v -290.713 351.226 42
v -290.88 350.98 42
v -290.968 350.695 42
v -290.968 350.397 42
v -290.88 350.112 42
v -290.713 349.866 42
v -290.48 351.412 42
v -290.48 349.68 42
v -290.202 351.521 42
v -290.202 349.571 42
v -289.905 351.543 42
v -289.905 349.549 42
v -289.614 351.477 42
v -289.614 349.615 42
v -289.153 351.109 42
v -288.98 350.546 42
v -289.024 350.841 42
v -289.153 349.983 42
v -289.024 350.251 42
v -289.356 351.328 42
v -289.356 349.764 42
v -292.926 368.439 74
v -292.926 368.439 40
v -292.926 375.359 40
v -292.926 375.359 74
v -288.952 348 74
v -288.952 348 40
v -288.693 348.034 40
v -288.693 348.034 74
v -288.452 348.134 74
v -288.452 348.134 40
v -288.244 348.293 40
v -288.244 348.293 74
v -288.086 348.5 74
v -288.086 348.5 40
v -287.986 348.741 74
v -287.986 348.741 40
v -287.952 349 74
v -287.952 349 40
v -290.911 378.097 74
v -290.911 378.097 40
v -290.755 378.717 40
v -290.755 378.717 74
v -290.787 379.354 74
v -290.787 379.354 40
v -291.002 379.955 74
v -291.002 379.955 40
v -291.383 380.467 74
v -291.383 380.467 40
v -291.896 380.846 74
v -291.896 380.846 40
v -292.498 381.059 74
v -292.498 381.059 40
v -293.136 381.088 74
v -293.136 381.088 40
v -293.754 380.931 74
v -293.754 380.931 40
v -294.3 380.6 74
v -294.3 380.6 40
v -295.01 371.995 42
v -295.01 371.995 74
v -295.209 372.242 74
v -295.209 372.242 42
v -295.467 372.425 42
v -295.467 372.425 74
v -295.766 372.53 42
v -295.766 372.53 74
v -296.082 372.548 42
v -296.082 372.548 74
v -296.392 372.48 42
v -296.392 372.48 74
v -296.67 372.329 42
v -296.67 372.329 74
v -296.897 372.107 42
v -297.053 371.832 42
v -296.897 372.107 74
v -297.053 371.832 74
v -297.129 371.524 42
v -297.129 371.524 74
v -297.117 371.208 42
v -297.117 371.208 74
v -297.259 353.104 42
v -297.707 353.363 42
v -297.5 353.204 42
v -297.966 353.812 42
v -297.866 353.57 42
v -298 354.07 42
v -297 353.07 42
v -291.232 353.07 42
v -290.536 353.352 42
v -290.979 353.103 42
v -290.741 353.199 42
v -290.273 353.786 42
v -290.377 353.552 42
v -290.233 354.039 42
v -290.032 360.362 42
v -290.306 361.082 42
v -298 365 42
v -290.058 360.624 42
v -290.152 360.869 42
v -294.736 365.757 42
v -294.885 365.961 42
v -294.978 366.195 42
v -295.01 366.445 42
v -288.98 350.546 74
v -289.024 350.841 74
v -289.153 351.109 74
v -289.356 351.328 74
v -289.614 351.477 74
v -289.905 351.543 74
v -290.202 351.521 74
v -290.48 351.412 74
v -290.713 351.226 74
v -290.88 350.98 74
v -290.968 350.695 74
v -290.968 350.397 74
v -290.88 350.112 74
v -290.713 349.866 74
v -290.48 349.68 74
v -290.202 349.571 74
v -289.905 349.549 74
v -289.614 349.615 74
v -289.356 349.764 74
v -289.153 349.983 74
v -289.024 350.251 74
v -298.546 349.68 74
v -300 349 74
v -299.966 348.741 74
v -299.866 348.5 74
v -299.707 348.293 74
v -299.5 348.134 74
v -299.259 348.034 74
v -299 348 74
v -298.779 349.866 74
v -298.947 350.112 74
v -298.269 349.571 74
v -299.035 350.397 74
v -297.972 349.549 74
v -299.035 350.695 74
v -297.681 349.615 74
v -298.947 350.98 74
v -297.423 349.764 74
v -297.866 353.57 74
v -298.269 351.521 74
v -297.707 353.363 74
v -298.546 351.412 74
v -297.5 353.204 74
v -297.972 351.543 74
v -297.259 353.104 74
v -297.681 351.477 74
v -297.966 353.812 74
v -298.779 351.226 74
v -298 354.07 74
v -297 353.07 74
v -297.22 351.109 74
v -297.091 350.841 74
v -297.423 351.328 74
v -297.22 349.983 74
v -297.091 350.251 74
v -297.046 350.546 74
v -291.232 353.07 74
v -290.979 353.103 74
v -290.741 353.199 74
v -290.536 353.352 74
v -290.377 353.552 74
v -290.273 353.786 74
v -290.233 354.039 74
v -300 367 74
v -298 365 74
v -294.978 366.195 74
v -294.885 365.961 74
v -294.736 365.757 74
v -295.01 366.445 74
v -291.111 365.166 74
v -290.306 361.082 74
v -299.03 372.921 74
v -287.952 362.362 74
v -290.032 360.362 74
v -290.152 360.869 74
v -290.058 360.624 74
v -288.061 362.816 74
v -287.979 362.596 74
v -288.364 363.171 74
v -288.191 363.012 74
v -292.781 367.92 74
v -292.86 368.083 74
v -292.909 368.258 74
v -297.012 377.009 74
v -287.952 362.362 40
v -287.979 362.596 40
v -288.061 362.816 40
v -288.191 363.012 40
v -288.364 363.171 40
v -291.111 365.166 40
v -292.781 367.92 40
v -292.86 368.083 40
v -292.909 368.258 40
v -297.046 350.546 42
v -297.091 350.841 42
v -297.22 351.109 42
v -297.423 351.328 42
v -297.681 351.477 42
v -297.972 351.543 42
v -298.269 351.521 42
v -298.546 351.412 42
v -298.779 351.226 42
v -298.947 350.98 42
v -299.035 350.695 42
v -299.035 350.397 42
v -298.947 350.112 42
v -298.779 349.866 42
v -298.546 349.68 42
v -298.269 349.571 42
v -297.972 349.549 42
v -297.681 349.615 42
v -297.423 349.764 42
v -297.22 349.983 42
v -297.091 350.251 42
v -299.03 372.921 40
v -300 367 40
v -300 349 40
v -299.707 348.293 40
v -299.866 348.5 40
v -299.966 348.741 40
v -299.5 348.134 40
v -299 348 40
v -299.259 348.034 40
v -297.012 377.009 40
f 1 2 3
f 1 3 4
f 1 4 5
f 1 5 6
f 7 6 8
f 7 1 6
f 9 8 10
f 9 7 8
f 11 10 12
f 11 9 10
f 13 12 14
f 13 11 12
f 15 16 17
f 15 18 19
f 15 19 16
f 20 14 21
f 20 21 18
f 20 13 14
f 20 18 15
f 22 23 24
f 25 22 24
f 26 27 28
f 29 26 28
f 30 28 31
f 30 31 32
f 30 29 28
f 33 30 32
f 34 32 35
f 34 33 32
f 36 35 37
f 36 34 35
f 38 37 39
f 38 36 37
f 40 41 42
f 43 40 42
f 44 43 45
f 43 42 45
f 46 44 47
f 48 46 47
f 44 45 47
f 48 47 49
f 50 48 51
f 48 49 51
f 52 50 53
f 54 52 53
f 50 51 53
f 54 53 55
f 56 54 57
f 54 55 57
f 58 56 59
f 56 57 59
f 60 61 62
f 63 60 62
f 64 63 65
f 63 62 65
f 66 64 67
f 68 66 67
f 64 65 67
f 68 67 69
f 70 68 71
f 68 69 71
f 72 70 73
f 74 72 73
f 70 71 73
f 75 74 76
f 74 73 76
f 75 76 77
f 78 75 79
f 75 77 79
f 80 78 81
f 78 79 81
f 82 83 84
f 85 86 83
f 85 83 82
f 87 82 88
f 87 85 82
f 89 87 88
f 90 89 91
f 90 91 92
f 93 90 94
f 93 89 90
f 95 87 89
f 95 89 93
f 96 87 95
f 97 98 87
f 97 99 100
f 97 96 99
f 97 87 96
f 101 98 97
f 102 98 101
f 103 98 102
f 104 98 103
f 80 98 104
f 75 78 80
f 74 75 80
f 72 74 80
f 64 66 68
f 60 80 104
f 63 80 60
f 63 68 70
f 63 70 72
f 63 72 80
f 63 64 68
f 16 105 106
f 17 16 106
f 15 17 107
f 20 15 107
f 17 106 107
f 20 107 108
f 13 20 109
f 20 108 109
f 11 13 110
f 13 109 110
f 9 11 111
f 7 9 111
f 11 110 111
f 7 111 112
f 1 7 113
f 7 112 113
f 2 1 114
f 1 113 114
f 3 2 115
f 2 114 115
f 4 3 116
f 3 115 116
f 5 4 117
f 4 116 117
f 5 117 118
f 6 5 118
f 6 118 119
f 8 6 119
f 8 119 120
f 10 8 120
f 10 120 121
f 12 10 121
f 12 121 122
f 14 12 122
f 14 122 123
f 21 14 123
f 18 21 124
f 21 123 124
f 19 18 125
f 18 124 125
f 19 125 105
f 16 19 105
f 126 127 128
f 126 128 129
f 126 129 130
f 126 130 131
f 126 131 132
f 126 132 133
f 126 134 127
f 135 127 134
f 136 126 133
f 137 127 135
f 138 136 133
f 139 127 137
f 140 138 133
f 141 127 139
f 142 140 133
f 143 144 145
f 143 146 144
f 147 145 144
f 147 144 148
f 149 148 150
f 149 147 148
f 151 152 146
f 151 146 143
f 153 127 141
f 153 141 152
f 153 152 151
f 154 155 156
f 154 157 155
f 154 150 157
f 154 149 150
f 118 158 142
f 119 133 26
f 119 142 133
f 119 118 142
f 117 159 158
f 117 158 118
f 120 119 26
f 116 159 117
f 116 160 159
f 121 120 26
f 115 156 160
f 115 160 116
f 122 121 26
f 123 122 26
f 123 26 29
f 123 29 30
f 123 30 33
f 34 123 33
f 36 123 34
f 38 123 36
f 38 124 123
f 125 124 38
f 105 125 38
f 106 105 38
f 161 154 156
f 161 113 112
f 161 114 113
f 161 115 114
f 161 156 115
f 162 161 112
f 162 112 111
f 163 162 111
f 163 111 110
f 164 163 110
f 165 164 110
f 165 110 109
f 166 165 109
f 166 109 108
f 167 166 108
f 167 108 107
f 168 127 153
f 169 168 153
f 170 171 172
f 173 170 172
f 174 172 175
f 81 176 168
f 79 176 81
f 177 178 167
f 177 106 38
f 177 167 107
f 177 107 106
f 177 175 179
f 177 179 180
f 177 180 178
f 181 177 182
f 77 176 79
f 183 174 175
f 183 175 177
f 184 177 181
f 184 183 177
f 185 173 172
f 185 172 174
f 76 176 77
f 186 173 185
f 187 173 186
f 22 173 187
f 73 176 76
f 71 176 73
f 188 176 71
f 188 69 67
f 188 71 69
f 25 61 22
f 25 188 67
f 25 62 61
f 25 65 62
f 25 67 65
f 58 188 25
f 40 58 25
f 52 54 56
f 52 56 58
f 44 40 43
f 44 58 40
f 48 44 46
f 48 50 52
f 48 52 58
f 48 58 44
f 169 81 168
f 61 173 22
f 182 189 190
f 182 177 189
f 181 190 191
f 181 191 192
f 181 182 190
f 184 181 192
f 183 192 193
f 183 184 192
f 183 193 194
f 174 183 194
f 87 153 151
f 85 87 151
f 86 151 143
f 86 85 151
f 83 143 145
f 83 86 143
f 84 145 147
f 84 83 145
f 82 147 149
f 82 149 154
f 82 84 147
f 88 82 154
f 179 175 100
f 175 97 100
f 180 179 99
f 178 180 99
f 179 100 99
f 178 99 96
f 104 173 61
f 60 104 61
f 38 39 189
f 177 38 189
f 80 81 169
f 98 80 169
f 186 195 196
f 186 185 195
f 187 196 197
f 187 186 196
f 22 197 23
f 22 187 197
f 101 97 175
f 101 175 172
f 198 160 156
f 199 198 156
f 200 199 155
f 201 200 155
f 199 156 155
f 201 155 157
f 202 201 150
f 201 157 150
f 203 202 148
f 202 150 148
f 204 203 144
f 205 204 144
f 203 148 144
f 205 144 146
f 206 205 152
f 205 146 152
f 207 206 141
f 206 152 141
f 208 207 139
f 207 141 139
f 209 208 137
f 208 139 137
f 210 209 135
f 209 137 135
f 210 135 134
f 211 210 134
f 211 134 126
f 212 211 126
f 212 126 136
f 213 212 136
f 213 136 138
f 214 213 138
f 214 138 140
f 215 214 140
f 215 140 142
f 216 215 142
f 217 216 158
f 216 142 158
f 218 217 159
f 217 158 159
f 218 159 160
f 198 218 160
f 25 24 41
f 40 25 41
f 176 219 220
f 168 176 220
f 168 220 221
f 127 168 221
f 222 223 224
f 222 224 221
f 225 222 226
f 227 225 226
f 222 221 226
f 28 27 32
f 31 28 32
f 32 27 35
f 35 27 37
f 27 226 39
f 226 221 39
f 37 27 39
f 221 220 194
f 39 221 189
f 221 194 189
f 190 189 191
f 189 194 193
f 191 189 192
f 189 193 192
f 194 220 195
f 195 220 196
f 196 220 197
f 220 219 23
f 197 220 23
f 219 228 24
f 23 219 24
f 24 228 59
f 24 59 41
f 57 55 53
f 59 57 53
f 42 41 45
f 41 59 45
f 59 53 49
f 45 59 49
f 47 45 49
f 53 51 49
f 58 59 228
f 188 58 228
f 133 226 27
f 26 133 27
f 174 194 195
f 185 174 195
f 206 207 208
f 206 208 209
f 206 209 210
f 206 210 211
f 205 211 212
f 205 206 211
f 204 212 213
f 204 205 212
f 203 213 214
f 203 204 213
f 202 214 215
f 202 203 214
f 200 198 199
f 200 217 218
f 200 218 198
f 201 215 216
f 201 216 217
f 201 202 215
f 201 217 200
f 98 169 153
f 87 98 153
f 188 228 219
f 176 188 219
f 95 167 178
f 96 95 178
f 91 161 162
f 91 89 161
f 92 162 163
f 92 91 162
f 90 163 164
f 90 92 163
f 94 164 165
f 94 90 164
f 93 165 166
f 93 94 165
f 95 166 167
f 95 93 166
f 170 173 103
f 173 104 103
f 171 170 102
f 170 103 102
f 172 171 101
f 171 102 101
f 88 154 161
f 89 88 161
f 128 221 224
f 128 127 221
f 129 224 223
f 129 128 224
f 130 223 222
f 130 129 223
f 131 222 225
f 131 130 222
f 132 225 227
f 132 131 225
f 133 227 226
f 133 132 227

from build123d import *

# Parameters (mm, degrees)
BOSS_EXTRUDE1_DEPTH = 34
CUT_EXTRUDE1_DEPTH  = 32
SKETCH3_R           = 1
CUT_EXTRUDE2_DEPTH  = 32
FILLET2_R           = 1


with BuildPart() as part:
    # Sketch1 → Boss-Extrude1 (new body)
    with BuildSketch(Plane.XY.offset(40)):
        with BuildLine():
            Line((-300, 367), (-300, 348))
            Line((-300, 348), (-287.95160644, 348))
            Line((-287.95160644, 348), (-287.95160644, 362.871836257))
            Line((-287.95160644, 362.871836257), (-291.110931396, 365.166412354))
            Line((-291.110931396, 365.166412354), (-292.925810618, 368.159105691))
            Line((-292.925810618, 368.159105691), (-292.925810618, 375.359105691))
            Line((-292.925810618, 375.359105691), (-290.910509572, 378.097455869))
            ThreePointArc((-290.910509572, 378.097455869), (-291.625724396, 380.675408146), (-294.299987793, 380.600006104))
            Line((-294.299987793, 380.600006104), (-297.012375964, 377.009330623))
            Line((-297.012375964, 377.009330623), (-299.029605392, 372.921007879))
            Line((-299.029605392, 372.921007879), (-300, 367))
        make_face()
    extrude(amount=BOSS_EXTRUDE1_DEPTH)

    # Sketch2 → Cut-Extrude1 (cut)
    with BuildSketch(Plane.XY.offset(74)):
        with BuildLine():
            Line((-297.116612998, 371.207677878), (-298, 365))
            Line((-298, 365), (-298, 353.070416706))
            Line((-298, 353.070416706), (-290.26344591, 353.070416706))
            Line((-290.26344591, 353.070416706), (-290.018829346, 360.778991699))
            Line((-290.018829346, 360.778991699), (-295.010009766, 366.046598155))
            Line((-295.010009766, 366.046598155), (-295.010009766, 371.995180703))
            ThreePointArc((-295.010009766, 371.995180703), (-296.391652801, 372.479756418), (-297.116612998, 371.207677878))
        make_face()
    extrude(amount=-CUT_EXTRUDE1_DEPTH, mode=Mode.SUBTRACT)

    # Sketch3 → Cut-Extrude2 (cut)
    with BuildSketch(Plane.XY.offset(74)):
        with Locations((-298.046417962, 350.546056216)):
            Circle(SKETCH3_R)
        with Locations((-289.979523898, 350.546056216)):
            Circle(SKETCH3_R)
    extrude(amount=-CUT_EXTRUDE2_DEPTH, mode=Mode.SUBTRACT)

    # Fillet2
    fillet2_edges = [part.edges().sort_by_distance(p)[0] for p in [
        (-292.925810618, 368.159105691, 57),
        (-287.95160644, 362.871836257, 57),
        (-287.95160644, 348, 57),
        (-300, 348, 57),
        (-295.010009766, 366.046598155, 58),
        (-290.018829346, 360.778991699, 58),
        (-290.26344591, 353.070416706, 58),
        (-298, 353.070416706, 58),
    ]]
    fillet(fillet2_edges, radius=FILLET2_R)


solid = part.part
